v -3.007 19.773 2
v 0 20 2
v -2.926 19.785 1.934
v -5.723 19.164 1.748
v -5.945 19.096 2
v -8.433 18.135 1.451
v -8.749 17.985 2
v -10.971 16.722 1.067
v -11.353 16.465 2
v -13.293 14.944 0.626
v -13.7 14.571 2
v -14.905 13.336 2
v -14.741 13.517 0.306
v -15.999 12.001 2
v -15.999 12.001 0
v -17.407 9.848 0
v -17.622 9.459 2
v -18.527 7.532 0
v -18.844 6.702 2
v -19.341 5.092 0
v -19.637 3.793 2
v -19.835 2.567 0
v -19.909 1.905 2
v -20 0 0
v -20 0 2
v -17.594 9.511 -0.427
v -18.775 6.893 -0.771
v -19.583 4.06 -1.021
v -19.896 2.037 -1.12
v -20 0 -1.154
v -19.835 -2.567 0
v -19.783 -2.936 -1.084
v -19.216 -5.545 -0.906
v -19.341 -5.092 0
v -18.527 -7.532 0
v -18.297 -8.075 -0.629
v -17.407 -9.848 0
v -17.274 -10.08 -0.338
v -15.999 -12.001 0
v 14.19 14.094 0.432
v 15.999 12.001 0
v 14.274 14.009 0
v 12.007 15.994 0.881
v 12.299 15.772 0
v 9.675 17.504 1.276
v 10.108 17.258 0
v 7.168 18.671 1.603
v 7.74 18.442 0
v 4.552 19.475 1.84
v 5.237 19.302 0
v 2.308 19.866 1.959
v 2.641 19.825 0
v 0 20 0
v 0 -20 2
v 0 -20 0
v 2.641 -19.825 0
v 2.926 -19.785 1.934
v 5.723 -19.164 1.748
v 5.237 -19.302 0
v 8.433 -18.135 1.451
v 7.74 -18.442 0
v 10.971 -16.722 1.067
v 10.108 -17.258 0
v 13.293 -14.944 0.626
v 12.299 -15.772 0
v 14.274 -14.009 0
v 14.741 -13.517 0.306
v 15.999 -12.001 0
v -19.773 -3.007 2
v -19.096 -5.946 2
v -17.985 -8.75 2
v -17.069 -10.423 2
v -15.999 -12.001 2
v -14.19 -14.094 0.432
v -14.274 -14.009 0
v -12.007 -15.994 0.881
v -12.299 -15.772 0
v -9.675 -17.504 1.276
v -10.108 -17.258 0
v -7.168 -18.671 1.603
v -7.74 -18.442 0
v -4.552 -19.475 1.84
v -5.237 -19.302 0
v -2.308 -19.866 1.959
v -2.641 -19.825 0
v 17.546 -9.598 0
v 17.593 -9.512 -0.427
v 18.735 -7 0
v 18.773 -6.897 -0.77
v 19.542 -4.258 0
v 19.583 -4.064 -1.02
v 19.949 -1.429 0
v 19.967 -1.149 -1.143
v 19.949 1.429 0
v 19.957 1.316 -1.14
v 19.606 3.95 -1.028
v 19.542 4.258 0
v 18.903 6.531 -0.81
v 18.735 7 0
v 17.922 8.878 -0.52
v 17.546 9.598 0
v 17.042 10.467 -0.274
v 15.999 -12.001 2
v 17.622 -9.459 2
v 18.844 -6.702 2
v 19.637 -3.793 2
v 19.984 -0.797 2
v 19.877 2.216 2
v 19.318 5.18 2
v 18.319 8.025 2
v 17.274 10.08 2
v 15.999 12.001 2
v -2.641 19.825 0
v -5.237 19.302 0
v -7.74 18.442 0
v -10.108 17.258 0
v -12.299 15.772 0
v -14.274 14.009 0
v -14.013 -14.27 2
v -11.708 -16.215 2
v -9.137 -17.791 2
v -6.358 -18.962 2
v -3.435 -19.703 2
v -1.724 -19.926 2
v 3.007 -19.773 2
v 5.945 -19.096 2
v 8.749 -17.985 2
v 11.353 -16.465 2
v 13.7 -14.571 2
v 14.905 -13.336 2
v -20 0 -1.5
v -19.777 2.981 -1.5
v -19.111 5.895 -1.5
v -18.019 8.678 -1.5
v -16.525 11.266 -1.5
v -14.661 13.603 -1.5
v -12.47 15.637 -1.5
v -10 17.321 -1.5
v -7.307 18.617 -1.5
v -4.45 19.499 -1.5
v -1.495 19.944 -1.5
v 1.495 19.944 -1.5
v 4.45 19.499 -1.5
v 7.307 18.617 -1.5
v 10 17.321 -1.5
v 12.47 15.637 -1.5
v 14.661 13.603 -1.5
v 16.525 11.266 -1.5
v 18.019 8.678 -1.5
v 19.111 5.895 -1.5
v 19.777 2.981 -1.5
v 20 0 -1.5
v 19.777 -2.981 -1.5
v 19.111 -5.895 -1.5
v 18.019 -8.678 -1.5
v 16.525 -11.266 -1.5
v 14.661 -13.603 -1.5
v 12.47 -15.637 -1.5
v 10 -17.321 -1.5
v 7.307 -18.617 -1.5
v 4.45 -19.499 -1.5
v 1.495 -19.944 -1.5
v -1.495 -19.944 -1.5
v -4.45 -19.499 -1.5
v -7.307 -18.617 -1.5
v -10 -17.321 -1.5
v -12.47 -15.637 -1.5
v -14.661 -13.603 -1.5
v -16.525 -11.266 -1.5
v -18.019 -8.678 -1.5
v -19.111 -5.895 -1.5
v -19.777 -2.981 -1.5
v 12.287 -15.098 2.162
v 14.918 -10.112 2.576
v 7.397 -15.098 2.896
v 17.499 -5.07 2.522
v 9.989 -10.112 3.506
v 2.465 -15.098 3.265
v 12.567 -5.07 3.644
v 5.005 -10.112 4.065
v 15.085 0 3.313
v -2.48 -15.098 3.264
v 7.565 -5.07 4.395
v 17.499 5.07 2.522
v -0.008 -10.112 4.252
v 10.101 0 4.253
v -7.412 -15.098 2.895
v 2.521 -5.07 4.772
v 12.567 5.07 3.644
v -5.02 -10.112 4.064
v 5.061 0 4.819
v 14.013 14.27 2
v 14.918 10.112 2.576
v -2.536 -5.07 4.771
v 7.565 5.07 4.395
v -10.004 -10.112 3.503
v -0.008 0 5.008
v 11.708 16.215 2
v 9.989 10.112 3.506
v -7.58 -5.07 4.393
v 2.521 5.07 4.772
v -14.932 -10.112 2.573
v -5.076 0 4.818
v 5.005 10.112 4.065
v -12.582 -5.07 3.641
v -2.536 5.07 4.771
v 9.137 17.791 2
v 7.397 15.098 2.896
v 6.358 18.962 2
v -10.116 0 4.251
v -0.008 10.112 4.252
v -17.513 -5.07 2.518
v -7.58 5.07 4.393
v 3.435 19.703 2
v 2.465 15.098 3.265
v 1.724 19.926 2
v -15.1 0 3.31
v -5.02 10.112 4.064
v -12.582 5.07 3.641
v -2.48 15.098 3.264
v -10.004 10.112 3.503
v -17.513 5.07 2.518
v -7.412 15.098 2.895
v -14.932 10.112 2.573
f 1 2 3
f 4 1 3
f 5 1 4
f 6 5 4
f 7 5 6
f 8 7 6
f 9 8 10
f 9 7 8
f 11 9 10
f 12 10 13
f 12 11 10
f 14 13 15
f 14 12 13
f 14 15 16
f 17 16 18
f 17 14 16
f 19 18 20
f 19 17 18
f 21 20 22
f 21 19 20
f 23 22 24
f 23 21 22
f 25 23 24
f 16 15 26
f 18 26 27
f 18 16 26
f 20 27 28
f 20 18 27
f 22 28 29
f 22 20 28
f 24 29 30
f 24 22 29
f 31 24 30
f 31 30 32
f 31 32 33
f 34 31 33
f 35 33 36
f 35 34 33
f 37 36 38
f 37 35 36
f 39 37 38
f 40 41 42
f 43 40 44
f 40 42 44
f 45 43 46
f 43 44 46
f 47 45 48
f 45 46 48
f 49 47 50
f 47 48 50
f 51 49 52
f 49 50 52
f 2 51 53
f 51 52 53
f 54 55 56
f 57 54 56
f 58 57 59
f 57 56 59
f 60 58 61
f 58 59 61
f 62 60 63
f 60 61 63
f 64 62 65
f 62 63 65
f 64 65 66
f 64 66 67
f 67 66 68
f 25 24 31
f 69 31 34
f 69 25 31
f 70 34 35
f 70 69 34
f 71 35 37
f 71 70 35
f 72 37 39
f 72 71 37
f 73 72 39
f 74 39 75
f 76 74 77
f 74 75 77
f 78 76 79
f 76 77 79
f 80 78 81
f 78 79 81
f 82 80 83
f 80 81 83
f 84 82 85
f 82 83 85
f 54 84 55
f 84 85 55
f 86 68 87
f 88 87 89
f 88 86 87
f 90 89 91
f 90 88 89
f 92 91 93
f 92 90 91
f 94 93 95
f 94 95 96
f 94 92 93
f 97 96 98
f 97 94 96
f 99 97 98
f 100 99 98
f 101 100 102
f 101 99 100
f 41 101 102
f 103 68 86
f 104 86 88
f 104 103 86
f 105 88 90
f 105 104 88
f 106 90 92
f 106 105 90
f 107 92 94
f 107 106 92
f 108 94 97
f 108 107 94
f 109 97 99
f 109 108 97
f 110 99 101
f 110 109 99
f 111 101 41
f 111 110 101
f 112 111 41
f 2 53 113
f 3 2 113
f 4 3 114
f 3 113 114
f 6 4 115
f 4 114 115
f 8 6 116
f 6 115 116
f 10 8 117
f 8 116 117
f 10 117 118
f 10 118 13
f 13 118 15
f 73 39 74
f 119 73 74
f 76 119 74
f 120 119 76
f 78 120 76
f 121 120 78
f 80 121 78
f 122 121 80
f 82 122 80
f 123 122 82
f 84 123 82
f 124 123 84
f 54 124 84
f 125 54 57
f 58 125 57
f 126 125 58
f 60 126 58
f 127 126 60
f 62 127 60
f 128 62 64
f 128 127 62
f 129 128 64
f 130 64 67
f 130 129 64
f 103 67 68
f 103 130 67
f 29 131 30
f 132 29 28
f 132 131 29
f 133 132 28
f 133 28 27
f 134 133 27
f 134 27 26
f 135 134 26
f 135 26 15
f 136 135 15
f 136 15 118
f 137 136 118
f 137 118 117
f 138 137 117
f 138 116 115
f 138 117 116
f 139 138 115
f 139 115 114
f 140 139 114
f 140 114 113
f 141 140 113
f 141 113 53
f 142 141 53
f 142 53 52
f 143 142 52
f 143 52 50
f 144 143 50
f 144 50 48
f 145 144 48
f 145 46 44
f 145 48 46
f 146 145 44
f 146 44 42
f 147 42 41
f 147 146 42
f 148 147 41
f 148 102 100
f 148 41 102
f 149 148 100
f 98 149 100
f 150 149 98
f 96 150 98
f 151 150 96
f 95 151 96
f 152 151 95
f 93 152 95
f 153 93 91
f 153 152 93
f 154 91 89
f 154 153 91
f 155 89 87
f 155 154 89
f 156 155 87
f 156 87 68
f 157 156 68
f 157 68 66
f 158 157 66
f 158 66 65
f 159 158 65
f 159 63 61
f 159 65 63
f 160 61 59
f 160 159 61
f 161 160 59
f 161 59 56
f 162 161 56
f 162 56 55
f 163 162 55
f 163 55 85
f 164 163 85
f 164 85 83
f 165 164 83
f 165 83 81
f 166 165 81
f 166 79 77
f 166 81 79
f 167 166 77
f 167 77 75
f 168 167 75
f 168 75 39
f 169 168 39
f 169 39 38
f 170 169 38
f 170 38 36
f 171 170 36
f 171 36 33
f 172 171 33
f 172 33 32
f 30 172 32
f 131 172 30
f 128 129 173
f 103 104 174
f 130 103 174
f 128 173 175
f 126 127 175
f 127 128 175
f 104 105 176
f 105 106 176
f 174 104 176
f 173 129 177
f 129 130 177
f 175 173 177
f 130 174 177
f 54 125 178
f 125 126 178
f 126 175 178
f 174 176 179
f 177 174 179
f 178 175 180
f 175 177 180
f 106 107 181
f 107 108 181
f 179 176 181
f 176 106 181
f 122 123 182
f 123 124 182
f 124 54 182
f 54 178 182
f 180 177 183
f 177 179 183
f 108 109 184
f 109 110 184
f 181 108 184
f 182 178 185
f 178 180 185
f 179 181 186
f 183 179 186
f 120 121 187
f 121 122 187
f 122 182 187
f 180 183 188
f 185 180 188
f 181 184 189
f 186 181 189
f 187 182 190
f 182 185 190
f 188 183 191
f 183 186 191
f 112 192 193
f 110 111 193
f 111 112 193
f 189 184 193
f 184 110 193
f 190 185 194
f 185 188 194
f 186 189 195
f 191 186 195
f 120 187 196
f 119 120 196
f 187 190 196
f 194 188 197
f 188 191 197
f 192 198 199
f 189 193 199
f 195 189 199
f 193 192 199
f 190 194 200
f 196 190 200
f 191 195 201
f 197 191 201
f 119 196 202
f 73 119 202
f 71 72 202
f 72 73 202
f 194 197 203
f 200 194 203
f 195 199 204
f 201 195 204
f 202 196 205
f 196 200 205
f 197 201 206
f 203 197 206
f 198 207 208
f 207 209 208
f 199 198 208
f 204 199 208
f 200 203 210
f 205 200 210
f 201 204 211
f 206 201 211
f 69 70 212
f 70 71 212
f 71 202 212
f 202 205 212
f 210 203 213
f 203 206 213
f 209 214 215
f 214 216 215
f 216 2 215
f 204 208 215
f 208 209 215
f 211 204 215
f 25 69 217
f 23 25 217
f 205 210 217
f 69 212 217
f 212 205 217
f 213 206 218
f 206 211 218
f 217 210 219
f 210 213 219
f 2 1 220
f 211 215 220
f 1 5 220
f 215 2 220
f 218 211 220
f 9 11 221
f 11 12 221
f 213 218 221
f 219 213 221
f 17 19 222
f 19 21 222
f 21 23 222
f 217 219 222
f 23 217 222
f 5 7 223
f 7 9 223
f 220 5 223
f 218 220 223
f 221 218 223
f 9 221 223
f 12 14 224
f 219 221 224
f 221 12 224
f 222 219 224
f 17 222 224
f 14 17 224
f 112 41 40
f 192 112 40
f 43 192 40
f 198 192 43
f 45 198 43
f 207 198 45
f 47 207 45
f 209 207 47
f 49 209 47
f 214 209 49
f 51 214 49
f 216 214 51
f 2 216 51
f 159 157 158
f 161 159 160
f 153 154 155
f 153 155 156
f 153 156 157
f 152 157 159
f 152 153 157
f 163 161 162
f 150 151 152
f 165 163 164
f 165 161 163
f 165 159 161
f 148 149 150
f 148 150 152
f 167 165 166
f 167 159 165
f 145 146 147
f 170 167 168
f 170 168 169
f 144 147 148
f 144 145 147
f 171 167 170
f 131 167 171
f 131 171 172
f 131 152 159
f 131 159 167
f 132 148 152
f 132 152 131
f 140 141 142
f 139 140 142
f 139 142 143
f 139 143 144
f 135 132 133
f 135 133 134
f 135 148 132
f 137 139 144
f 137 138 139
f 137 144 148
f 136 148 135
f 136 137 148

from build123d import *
from build123d.topology import SkipClean

# Parameters (mm, degrees)
SKETCH1_R               = 20
BOSS_EXTRUDE1_DEPTH     = 2
CUT_EXTRUDE1_DEPTH      = 149.939533232
CUT_EXTRUDE1_DEPTH_BACK = 149.939533232
SKETCH4_R               = 20
BOSS_EXTRUDE2_DEPTH     = 2
CUT_EXTRUDE2_DEPTH      = 60.117570106
CUT_EXTRUDE2_DEPTH_BACK = 60.117570106
BOSS_EXTRUDE3_START     = 1.5
SKETCH6_R               = 20
BOSS_EXTRUDE3_DEPTH     = 1.5


with BuildPart() as part:
    # Sketch1 → Boss-Extrude1 (new body)
    with BuildSketch(Plane.XY):
        Circle(SKETCH1_R)
    extrude(amount=BOSS_EXTRUDE1_DEPTH)

    # Sketch2 → Revolve1 (revolve)
    with BuildSketch(Plane(origin=(0, 0, 0), x_dir=(0, 0, -1), z_dir=(1, 0, 0))):
        with BuildLine():
            Line((-2, 20), (-2, -20))
            ThreePointArc((-2, -20), (-5.007692763, 0), (-2, 20))
        make_face()
    revolve(axis=Axis((0, 18.147187934, -62.992307237), (0, -1, 0)))

    # Sketch3 → Cut-Extrude1 (cut, two sides: drawn at the far end of the back side and taken through both)
    with BuildSketch(Plane(origin=(0, 0, 0), x_dir=(1, 0, 0), z_dir=(0, 1, 0)).offset(-CUT_EXTRUDE1_DEPTH_BACK)):
        Polygon((76.406042556, 19.358854798), (-76.406042556, 19.358854798), (-76.406042556, 108.879477381), (-76.406042556, 197.624528818), (96.484941814, 197.624528818), (96.484941814, 108.879477381), (76.406042556, 108.879477381), align=None)
    extrude(amount=CUT_EXTRUDE1_DEPTH + CUT_EXTRUDE1_DEPTH_BACK, mode=Mode.SUBTRACT)

    # Sketch4 → Boss-Extrude2 (add)
    with BuildSketch(Plane(origin=(0, 0, 0), x_dir=(-1, 0, 0), z_dir=(0, 0, -1))):
        Circle(SKETCH4_R)
    extrude(amount=-BOSS_EXTRUDE2_DEPTH)

    # Sketch5 → Cut-Extrude2 (cut, two sides: drawn at the far end of the back side and taken through both)
    with SkipClean():  # the faces are left unmerged after this step: merging them gives an invalid solid
        with BuildSketch(Plane(origin=(0, 0, 0), x_dir=(-1, 0, 0), z_dir=(0, 0, -1)).offset(-CUT_EXTRUDE2_DEPTH_BACK)):
            with BuildLine():
                ThreePointArc((-15.999038376, 12.001282059), (-8.94355521, 17.888902152), (-4.9e-08, 20))
                Line((-4.9e-08, 20), (-70.945492499, 20))
                Line((-70.945492499, 20), (-70.945492499, -20))
                Line((-70.945492499, -20), (2.6e-08, -20))
                ThreePointArc((2.6e-08, -20), (-8.943555177, -17.888902169), (-15.999038376, -12.001282059))
                ThreePointArc((-15.999038376, -12.001282059), (-20, 0), (-15.999038376, 12.001282059))
            make_face()
            with BuildLine():
                Line((70.945492499, -20), (70.945492499, 20))
                Line((70.945492499, 20), (-4.9e-08, 20))
                ThreePointArc((-4.9e-08, 20), (8.943555167, 17.888902174), (15.999038376, 12.001282059))
                ThreePointArc((15.999038376, 12.001282059), (18.973412549, 6.325315505), (20, 0))
                ThreePointArc((20, 0), (18.973412549, -6.325315505), (15.999038376, -12.001282059))
                ThreePointArc((15.999038376, -12.001282059), (8.9435552, -17.888902157), (2.6e-08, -20))
                Line((2.6e-08, -20), (70.945492499, -20))
            make_face()
        extrude(amount=CUT_EXTRUDE2_DEPTH + CUT_EXTRUDE2_DEPTH_BACK, mode=Mode.SUBTRACT)

    # Sketch6 → Boss-Extrude3 (add)
    with SkipClean():  # the faces are left unmerged after this step: merging them gives an invalid solid
        with BuildSketch(Plane(origin=(0, 0, 0), x_dir=(-1, 0, 0), z_dir=(0, 0, -1)).offset(BOSS_EXTRUDE3_START)):
            Circle(SKETCH6_R)
        extrude(amount=-BOSS_EXTRUDE3_DEPTH)


solid = part.part
